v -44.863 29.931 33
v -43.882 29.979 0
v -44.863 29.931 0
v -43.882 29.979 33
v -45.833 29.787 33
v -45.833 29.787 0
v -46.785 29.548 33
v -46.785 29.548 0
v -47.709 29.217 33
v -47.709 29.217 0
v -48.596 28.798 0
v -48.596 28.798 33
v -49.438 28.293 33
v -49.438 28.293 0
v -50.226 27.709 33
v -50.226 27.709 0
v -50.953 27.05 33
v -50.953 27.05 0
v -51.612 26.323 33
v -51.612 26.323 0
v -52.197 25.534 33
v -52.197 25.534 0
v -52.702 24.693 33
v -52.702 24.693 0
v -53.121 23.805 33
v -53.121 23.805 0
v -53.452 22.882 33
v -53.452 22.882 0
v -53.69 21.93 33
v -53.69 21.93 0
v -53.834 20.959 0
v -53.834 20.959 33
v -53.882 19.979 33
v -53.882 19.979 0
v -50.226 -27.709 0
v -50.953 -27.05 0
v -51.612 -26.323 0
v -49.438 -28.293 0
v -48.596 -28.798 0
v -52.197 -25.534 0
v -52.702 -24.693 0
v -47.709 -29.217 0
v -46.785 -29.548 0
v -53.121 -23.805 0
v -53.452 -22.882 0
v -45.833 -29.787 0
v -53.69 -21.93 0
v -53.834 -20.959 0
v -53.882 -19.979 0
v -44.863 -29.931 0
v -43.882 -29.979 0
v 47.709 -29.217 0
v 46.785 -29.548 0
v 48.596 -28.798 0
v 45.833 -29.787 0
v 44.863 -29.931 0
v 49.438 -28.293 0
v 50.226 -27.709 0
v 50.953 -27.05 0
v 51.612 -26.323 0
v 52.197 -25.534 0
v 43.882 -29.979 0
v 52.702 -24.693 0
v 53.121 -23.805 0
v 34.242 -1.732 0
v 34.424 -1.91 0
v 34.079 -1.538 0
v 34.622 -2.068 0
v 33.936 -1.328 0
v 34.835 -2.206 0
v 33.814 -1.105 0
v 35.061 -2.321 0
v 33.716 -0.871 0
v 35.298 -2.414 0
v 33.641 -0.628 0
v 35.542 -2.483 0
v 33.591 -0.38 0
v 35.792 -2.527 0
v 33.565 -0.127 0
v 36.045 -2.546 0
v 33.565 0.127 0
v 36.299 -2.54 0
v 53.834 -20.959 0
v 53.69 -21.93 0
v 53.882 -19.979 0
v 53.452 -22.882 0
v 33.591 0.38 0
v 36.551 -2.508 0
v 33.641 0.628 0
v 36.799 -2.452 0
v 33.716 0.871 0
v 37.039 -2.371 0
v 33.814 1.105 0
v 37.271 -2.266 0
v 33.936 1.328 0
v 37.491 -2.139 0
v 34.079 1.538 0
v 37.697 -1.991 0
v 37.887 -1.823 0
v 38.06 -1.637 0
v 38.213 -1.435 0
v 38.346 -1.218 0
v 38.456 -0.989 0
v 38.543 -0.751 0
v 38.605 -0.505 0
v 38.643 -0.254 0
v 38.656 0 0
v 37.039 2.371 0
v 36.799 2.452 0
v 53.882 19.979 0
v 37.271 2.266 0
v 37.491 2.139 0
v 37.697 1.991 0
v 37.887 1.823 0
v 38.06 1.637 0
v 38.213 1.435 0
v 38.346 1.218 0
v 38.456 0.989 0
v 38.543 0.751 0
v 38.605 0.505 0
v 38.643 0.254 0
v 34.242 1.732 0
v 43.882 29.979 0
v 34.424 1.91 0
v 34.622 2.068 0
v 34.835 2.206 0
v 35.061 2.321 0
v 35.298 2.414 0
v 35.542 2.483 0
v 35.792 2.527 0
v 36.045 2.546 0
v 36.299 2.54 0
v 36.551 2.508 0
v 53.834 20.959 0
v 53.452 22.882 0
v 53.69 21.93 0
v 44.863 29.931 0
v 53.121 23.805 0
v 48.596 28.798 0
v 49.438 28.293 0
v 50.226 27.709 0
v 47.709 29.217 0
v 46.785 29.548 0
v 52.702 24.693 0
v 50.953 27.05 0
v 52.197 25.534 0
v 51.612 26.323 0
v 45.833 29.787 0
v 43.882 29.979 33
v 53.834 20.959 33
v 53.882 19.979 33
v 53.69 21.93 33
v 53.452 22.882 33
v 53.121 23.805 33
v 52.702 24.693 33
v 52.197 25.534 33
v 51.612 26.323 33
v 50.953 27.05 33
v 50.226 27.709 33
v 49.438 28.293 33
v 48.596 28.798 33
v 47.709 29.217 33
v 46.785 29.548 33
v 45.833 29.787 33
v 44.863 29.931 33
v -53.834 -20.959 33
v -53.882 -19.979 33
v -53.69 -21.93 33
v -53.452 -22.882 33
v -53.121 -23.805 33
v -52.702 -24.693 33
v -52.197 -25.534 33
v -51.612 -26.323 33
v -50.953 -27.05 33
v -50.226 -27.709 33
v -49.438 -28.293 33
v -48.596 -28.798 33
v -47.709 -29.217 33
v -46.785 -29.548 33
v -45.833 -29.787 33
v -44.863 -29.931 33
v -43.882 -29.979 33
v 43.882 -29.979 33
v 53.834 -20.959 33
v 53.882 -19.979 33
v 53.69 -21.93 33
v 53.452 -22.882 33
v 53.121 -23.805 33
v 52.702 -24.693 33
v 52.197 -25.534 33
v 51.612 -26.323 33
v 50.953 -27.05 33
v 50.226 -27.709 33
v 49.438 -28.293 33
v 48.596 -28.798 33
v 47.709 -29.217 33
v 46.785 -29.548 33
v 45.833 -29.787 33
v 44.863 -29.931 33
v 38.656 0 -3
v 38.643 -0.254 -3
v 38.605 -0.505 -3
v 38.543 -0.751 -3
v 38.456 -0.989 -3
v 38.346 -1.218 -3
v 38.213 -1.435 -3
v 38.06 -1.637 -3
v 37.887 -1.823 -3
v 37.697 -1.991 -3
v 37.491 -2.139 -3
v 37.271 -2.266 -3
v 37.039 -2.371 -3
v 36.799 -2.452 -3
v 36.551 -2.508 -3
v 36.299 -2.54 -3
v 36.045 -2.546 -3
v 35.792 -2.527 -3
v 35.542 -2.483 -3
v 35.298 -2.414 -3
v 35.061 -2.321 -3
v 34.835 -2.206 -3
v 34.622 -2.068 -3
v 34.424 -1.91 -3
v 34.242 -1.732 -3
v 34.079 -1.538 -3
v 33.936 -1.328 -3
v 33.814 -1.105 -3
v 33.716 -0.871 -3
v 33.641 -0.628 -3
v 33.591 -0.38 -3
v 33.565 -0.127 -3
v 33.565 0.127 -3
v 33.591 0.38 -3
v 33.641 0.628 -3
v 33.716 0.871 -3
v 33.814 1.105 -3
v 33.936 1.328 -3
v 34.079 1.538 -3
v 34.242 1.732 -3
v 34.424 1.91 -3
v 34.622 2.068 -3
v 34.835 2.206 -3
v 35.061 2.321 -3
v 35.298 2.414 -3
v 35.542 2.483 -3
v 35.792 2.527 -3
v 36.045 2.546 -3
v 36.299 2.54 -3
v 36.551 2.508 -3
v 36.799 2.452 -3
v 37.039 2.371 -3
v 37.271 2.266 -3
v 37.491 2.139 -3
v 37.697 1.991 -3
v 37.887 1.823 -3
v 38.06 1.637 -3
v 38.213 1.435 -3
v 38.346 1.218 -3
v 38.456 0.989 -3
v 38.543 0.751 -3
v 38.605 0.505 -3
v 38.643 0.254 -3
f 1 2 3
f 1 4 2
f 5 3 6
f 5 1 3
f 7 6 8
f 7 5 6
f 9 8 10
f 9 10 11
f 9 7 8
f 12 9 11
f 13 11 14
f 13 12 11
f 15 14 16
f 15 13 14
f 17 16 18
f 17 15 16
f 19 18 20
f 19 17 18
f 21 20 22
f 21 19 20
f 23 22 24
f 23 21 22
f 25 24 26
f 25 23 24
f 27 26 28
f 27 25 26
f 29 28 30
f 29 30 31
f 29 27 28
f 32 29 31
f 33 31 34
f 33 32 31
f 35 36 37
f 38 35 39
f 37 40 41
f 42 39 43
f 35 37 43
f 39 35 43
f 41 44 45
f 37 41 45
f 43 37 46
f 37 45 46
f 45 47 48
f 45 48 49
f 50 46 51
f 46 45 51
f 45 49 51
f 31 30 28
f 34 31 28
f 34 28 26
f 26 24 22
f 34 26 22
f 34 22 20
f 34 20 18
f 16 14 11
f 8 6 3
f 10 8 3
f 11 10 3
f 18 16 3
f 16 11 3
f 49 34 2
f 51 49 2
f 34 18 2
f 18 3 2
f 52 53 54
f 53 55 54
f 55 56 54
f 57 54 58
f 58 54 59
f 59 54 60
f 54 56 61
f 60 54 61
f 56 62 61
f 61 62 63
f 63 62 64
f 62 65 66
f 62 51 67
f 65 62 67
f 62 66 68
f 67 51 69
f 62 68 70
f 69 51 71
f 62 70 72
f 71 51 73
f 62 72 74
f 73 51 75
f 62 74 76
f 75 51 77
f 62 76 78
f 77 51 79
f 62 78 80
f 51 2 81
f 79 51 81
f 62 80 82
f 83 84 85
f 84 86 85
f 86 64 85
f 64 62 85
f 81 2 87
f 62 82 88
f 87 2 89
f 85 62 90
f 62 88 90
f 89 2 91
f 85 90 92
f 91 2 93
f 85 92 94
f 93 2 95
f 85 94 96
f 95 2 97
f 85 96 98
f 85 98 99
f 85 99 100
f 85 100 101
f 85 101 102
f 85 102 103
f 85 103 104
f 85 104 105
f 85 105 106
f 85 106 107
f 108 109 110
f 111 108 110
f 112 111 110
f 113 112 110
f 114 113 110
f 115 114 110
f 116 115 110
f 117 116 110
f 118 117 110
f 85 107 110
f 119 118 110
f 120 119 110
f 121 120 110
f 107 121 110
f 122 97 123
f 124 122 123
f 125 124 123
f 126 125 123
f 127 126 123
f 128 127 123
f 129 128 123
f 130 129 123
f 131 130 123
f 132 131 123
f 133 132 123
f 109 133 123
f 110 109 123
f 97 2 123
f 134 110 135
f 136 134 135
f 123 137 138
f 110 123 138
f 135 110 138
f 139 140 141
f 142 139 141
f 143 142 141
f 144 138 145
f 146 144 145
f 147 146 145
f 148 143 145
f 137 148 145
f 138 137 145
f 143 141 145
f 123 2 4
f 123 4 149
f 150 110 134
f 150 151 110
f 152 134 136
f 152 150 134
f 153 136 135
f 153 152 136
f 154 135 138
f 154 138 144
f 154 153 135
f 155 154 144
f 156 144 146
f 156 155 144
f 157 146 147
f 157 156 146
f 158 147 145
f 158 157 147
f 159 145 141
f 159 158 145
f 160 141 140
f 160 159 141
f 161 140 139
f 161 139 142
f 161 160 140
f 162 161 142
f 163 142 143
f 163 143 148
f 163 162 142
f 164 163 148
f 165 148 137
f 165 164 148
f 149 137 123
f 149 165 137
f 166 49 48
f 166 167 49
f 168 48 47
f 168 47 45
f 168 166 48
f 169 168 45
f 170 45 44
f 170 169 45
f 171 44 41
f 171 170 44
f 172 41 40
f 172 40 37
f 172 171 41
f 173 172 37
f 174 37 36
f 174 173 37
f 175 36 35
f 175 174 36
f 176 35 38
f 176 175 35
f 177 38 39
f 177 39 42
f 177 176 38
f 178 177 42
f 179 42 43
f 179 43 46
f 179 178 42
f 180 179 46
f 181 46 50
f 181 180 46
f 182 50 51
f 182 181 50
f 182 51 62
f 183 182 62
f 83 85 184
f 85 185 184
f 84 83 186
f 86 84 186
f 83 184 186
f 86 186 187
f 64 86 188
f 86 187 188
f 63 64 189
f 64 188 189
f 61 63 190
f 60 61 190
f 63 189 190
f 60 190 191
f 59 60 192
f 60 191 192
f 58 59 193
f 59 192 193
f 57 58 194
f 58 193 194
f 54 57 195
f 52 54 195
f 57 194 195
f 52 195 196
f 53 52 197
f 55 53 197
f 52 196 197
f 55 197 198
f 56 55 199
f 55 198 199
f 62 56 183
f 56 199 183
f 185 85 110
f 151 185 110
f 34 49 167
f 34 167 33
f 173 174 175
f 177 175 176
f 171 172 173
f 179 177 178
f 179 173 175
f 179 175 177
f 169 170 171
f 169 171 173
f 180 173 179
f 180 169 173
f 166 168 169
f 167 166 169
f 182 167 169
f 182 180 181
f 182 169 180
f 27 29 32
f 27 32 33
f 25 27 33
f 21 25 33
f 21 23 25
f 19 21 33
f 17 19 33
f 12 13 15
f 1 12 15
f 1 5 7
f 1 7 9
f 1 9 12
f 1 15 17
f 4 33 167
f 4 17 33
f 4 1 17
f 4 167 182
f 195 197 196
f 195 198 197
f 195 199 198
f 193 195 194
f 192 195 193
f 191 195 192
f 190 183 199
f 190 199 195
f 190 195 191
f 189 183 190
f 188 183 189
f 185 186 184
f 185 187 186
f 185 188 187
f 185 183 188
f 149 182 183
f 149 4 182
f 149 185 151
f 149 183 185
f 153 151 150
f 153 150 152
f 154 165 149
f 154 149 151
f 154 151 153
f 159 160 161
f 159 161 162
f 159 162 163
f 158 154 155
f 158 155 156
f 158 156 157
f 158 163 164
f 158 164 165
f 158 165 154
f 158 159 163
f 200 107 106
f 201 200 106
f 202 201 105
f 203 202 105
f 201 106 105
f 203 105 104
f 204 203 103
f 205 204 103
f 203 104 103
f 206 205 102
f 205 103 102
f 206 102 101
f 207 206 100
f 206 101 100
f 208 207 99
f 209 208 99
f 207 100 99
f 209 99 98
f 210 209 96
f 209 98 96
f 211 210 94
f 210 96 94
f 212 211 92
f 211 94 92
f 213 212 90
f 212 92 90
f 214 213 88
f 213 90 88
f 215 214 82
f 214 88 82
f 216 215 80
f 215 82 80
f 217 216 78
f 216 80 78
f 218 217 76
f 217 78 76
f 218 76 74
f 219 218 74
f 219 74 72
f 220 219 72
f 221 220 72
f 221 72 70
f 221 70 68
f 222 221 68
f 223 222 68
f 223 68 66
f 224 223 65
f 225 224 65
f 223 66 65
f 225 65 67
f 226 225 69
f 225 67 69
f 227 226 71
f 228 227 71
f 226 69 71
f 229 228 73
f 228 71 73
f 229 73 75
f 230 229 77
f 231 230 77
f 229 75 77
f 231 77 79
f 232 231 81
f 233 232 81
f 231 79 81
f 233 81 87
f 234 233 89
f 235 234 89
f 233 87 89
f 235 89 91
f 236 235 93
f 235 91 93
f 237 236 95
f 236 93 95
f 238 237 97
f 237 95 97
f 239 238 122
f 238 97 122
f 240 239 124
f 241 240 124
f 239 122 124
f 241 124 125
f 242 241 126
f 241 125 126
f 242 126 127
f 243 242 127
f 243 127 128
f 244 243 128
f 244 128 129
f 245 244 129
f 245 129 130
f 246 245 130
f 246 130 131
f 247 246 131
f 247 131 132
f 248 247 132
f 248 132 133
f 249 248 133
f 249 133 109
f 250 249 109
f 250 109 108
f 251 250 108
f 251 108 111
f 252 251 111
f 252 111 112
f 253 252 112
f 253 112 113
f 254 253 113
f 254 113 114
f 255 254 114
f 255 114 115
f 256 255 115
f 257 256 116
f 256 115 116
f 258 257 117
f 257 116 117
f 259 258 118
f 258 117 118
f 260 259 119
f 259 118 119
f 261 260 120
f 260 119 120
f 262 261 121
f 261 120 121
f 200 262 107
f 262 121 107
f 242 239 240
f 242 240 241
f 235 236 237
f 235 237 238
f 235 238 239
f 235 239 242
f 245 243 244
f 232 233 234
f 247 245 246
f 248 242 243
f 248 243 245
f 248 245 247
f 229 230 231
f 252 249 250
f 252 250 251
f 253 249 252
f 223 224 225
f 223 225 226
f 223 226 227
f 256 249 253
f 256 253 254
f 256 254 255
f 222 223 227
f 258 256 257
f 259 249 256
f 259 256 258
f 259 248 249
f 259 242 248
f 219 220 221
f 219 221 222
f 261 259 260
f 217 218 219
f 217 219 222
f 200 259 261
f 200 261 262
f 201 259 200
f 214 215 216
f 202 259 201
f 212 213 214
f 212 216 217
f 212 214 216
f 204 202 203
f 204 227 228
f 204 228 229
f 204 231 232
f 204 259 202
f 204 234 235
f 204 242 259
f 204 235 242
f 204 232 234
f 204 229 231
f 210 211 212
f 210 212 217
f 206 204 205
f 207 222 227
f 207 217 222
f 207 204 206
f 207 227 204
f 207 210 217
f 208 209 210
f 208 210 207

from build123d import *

# Parameters (mm, degrees)
SKETCH_1_W      = 107.764696886
SKETCH_1_H      = 59.957319102
EXTRUDE_1_DEPTH = 33
FILLET_1_R      = 10
FILLET_2_R      = 10
FILLET_4_R      = 10
FILLET_5_R      = 10
SKETCH_2_R      = 2.546868178
EXTRUDE_2_DEPTH = 3


with BuildPart() as part:
    # 草图1 → 凸台-拉伸1 (new body)
    with BuildSketch(Plane.XY):
        Rectangle(SKETCH_1_W, SKETCH_1_H)
    extrude(amount=EXTRUDE_1_DEPTH)

    # 圆角1
    fillet_1_edges = [part.edges().sort_by_distance(p)[0] for p in [
        (53.882348443, 29.978659551, 16.5),
    ]]
    fillet(fillet_1_edges, radius=FILLET_1_R)

    # 圆角2
    fillet_2_edges = [part.edges().sort_by_distance(p)[0] for p in [
        (53.882348443, -29.978659551, 16.5),
    ]]
    fillet(fillet_2_edges, radius=FILLET_2_R)

    # 圆角4
    fillet_4_edges = [part.edges().sort_by_distance(p)[0] for p in [
        (-53.882348443, 29.978659551, 16.5),
    ]]
    fillet(fillet_4_edges, radius=FILLET_4_R)

    # 圆角5
    fillet_5_edges = [part.edges().sort_by_distance(p)[0] for p in [
        (-53.882348443, -29.978659551, 16.5),
    ]]
    fillet(fillet_5_edges, radius=FILLET_5_R)

    # 草图2 → 凸台-拉伸2 (add)
    with BuildSketch(Plane(origin=(0, 0, 0), x_dir=(-1, 0, 0), z_dir=(0, 0, -1))):
        with Locations(Location((-36.108931064, 0, 0), (0, 0, 180))):
            Circle(SKETCH_2_R)
    extrude(amount=EXTRUDE_2_DEPTH)


solid = part.part
